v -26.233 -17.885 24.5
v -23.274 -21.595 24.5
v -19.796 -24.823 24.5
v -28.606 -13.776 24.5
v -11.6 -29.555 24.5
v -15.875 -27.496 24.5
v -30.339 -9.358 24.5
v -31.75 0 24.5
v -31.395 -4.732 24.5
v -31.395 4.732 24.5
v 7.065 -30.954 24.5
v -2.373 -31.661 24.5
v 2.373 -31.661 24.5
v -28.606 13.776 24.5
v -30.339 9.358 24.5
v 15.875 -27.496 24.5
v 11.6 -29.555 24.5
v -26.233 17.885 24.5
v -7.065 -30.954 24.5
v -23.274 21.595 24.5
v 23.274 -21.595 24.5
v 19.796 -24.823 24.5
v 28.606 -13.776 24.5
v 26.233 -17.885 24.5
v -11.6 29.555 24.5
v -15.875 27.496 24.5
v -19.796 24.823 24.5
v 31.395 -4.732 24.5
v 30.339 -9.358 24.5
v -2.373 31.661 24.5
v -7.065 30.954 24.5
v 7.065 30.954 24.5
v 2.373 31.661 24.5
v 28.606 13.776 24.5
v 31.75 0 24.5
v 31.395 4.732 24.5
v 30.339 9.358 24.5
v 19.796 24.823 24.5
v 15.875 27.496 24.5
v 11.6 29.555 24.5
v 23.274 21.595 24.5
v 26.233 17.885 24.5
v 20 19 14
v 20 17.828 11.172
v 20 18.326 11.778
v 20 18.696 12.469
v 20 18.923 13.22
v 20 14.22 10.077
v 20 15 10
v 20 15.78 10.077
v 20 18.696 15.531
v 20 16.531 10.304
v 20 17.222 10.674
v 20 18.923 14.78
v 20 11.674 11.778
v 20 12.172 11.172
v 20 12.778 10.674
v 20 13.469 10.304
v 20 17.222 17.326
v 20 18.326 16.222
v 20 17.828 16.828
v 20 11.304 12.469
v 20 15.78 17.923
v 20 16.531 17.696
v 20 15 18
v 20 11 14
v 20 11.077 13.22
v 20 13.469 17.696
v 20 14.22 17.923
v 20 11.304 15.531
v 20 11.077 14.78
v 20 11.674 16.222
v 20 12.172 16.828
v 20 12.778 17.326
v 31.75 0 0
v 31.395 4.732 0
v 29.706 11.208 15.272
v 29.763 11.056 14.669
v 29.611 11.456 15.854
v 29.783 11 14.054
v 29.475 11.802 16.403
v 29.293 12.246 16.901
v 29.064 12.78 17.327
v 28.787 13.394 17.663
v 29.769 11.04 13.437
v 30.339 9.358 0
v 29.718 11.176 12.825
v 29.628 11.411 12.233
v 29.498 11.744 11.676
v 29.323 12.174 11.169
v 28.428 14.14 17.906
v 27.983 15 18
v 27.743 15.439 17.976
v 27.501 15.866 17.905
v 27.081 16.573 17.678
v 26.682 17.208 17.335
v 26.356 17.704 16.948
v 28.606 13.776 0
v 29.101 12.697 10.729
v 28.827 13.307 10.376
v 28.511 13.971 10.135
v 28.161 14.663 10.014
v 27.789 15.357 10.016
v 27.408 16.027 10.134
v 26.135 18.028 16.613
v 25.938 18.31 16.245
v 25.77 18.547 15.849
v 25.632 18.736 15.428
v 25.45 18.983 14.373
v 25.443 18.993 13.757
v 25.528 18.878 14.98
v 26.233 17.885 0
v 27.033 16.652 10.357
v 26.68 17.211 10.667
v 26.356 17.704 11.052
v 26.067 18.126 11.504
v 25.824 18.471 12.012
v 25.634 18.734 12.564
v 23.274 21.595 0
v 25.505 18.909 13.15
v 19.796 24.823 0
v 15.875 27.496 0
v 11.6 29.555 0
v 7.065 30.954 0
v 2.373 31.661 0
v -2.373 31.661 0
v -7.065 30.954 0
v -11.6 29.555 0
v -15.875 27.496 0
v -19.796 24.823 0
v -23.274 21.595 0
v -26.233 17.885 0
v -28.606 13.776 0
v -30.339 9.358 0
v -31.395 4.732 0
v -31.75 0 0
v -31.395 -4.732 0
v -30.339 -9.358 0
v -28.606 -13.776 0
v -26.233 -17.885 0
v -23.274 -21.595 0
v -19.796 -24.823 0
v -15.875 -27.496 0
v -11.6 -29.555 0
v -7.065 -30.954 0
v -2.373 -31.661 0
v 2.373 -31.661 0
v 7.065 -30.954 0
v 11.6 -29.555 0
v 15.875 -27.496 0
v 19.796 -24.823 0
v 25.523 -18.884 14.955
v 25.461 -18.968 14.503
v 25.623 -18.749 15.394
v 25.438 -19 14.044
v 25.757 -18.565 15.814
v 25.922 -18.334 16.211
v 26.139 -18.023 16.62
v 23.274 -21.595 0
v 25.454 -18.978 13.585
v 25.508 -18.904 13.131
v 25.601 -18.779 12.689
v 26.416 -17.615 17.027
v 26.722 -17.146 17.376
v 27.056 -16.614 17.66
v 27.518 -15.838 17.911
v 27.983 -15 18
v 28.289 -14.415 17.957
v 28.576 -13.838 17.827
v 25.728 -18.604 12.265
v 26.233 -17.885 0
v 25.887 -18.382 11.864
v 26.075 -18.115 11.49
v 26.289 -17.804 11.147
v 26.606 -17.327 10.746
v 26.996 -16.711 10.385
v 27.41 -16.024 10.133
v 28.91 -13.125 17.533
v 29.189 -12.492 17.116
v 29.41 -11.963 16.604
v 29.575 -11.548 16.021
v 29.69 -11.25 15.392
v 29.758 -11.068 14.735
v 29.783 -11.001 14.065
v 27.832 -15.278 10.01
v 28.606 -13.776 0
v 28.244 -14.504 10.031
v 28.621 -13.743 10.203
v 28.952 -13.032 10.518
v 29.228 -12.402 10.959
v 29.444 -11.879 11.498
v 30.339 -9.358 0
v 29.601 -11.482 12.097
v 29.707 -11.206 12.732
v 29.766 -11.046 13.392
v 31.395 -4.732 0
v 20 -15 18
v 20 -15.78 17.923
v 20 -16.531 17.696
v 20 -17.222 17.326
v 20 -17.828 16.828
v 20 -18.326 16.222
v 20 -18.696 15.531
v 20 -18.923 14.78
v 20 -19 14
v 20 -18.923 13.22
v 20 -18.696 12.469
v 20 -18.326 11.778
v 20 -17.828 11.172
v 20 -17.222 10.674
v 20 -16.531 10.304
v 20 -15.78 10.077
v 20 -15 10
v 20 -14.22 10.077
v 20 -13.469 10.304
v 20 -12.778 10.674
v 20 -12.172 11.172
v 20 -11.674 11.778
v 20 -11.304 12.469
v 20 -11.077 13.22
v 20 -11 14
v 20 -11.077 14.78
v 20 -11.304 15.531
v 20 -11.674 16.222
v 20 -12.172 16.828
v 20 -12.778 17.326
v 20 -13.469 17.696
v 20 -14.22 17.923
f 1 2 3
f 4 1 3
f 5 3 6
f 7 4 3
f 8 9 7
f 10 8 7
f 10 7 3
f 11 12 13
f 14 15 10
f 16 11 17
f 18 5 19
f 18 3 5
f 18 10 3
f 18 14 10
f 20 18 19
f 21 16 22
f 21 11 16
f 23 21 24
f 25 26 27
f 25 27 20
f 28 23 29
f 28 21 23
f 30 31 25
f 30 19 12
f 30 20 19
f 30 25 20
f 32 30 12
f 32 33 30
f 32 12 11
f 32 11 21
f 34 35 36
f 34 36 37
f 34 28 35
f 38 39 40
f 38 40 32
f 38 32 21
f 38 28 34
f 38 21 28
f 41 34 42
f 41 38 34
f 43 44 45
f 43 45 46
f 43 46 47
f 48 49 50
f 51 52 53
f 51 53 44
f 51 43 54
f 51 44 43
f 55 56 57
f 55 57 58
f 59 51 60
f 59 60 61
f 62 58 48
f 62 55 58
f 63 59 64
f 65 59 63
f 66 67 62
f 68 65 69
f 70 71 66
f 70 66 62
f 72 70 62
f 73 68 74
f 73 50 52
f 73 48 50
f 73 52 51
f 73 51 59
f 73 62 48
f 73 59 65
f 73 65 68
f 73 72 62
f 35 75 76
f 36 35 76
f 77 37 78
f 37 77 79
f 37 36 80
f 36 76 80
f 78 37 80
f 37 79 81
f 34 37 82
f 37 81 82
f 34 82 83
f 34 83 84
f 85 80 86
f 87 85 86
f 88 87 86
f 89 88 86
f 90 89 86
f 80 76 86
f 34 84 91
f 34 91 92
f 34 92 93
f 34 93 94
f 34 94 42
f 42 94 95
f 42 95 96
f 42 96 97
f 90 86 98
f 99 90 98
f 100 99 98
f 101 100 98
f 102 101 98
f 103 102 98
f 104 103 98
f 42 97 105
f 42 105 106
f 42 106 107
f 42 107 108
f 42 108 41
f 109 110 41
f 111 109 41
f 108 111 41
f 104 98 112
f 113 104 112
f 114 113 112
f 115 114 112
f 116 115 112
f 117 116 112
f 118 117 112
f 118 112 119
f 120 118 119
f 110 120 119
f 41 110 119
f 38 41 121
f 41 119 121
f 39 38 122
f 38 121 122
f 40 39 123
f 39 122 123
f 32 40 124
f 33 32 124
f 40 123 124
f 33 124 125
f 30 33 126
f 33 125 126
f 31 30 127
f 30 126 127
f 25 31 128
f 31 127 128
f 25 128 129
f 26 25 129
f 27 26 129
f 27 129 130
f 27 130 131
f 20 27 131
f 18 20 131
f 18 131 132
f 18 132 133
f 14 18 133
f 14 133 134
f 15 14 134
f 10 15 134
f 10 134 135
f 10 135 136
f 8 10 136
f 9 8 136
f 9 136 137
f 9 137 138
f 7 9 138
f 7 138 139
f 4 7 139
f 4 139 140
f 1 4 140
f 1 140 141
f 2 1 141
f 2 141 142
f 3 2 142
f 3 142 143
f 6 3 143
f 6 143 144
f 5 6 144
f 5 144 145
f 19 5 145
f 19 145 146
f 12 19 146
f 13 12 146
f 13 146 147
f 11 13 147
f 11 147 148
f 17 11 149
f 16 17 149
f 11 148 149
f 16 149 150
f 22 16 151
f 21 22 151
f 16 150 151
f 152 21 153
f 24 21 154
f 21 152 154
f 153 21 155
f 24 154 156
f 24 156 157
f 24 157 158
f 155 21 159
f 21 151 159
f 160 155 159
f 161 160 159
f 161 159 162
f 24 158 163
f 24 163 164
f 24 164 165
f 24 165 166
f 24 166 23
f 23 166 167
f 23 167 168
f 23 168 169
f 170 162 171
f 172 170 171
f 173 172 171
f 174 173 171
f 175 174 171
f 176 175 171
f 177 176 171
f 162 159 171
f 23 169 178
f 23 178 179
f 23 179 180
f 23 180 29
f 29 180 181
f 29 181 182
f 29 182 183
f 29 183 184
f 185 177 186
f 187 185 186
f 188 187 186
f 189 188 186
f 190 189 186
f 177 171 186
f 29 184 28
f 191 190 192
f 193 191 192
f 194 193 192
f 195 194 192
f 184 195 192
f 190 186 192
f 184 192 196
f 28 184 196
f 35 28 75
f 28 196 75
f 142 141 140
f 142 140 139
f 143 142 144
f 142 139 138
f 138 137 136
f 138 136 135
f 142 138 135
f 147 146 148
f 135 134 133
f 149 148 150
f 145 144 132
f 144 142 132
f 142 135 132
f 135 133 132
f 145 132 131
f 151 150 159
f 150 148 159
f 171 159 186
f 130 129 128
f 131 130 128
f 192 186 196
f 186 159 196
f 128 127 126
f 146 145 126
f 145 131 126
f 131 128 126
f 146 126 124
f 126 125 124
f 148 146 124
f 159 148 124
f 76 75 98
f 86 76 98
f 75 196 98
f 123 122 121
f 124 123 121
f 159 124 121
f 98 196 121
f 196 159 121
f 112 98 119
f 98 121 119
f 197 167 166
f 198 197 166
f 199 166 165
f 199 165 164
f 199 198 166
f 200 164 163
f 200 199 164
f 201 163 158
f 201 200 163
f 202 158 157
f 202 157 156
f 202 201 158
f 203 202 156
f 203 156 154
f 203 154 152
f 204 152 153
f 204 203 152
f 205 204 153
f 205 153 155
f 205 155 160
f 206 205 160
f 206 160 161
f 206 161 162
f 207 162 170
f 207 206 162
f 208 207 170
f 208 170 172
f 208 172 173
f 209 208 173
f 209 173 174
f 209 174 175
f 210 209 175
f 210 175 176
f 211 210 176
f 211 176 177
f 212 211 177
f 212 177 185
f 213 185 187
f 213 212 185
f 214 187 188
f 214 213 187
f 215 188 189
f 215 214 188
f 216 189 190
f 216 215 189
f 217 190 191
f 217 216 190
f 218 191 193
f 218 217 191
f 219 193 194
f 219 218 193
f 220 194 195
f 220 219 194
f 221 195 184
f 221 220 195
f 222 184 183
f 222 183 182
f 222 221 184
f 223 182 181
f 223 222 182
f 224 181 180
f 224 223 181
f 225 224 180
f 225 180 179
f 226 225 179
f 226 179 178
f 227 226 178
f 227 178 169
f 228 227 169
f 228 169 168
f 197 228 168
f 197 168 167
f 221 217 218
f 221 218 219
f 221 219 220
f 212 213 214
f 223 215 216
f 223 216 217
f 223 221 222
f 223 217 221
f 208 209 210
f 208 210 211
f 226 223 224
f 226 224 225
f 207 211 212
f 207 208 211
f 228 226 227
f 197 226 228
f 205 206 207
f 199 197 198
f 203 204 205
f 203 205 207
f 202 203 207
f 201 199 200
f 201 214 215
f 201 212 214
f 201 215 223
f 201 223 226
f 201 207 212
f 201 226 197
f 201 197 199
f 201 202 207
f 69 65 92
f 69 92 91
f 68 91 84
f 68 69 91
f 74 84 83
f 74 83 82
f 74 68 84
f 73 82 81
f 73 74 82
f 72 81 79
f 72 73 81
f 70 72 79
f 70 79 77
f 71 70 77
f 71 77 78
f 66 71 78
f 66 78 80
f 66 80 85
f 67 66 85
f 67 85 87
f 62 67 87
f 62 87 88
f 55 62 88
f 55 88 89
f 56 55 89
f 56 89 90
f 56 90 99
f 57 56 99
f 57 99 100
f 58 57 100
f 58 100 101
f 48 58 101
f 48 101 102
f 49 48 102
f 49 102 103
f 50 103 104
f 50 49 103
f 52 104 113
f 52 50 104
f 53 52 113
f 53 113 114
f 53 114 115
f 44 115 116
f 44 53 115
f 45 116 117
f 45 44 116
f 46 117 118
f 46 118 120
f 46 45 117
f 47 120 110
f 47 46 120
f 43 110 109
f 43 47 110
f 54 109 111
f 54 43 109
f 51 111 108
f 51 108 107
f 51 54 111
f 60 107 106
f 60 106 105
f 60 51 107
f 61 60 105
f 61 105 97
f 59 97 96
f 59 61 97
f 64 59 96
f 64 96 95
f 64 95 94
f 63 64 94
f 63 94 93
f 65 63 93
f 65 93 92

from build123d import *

# Parameters (mm, degrees)
SKIZZE1_R        = 31.75
LIDAR_BASE_DEPTH = 24.5
SKIZZE2_R        = 4
SENSOR_CUT_DEPTH = 66.470413165


with BuildPart() as part:
    # Skizze1 → Lidar Base (new body)
    with BuildSketch(Plane.XY):
        Circle(SKIZZE1_R)
    extrude(amount=LIDAR_BASE_DEPTH)

    # Skizze2 → Sensor Cut (cut, through all)
    with BuildSketch(Plane(origin=(20, 0, 0), x_dir=(0, 0, -1), z_dir=(1, 0, 0))):
        with Locations(Location((-14, 15, 0), (0, 0, 180))):
            Circle(SKIZZE2_R)
        with Locations(Location((-14, -15, 0), (0, 0, 180))):
            Circle(SKIZZE2_R)
    extrude(amount=SENSOR_CUT_DEPTH, mode=Mode.SUBTRACT)


solid = part.part
